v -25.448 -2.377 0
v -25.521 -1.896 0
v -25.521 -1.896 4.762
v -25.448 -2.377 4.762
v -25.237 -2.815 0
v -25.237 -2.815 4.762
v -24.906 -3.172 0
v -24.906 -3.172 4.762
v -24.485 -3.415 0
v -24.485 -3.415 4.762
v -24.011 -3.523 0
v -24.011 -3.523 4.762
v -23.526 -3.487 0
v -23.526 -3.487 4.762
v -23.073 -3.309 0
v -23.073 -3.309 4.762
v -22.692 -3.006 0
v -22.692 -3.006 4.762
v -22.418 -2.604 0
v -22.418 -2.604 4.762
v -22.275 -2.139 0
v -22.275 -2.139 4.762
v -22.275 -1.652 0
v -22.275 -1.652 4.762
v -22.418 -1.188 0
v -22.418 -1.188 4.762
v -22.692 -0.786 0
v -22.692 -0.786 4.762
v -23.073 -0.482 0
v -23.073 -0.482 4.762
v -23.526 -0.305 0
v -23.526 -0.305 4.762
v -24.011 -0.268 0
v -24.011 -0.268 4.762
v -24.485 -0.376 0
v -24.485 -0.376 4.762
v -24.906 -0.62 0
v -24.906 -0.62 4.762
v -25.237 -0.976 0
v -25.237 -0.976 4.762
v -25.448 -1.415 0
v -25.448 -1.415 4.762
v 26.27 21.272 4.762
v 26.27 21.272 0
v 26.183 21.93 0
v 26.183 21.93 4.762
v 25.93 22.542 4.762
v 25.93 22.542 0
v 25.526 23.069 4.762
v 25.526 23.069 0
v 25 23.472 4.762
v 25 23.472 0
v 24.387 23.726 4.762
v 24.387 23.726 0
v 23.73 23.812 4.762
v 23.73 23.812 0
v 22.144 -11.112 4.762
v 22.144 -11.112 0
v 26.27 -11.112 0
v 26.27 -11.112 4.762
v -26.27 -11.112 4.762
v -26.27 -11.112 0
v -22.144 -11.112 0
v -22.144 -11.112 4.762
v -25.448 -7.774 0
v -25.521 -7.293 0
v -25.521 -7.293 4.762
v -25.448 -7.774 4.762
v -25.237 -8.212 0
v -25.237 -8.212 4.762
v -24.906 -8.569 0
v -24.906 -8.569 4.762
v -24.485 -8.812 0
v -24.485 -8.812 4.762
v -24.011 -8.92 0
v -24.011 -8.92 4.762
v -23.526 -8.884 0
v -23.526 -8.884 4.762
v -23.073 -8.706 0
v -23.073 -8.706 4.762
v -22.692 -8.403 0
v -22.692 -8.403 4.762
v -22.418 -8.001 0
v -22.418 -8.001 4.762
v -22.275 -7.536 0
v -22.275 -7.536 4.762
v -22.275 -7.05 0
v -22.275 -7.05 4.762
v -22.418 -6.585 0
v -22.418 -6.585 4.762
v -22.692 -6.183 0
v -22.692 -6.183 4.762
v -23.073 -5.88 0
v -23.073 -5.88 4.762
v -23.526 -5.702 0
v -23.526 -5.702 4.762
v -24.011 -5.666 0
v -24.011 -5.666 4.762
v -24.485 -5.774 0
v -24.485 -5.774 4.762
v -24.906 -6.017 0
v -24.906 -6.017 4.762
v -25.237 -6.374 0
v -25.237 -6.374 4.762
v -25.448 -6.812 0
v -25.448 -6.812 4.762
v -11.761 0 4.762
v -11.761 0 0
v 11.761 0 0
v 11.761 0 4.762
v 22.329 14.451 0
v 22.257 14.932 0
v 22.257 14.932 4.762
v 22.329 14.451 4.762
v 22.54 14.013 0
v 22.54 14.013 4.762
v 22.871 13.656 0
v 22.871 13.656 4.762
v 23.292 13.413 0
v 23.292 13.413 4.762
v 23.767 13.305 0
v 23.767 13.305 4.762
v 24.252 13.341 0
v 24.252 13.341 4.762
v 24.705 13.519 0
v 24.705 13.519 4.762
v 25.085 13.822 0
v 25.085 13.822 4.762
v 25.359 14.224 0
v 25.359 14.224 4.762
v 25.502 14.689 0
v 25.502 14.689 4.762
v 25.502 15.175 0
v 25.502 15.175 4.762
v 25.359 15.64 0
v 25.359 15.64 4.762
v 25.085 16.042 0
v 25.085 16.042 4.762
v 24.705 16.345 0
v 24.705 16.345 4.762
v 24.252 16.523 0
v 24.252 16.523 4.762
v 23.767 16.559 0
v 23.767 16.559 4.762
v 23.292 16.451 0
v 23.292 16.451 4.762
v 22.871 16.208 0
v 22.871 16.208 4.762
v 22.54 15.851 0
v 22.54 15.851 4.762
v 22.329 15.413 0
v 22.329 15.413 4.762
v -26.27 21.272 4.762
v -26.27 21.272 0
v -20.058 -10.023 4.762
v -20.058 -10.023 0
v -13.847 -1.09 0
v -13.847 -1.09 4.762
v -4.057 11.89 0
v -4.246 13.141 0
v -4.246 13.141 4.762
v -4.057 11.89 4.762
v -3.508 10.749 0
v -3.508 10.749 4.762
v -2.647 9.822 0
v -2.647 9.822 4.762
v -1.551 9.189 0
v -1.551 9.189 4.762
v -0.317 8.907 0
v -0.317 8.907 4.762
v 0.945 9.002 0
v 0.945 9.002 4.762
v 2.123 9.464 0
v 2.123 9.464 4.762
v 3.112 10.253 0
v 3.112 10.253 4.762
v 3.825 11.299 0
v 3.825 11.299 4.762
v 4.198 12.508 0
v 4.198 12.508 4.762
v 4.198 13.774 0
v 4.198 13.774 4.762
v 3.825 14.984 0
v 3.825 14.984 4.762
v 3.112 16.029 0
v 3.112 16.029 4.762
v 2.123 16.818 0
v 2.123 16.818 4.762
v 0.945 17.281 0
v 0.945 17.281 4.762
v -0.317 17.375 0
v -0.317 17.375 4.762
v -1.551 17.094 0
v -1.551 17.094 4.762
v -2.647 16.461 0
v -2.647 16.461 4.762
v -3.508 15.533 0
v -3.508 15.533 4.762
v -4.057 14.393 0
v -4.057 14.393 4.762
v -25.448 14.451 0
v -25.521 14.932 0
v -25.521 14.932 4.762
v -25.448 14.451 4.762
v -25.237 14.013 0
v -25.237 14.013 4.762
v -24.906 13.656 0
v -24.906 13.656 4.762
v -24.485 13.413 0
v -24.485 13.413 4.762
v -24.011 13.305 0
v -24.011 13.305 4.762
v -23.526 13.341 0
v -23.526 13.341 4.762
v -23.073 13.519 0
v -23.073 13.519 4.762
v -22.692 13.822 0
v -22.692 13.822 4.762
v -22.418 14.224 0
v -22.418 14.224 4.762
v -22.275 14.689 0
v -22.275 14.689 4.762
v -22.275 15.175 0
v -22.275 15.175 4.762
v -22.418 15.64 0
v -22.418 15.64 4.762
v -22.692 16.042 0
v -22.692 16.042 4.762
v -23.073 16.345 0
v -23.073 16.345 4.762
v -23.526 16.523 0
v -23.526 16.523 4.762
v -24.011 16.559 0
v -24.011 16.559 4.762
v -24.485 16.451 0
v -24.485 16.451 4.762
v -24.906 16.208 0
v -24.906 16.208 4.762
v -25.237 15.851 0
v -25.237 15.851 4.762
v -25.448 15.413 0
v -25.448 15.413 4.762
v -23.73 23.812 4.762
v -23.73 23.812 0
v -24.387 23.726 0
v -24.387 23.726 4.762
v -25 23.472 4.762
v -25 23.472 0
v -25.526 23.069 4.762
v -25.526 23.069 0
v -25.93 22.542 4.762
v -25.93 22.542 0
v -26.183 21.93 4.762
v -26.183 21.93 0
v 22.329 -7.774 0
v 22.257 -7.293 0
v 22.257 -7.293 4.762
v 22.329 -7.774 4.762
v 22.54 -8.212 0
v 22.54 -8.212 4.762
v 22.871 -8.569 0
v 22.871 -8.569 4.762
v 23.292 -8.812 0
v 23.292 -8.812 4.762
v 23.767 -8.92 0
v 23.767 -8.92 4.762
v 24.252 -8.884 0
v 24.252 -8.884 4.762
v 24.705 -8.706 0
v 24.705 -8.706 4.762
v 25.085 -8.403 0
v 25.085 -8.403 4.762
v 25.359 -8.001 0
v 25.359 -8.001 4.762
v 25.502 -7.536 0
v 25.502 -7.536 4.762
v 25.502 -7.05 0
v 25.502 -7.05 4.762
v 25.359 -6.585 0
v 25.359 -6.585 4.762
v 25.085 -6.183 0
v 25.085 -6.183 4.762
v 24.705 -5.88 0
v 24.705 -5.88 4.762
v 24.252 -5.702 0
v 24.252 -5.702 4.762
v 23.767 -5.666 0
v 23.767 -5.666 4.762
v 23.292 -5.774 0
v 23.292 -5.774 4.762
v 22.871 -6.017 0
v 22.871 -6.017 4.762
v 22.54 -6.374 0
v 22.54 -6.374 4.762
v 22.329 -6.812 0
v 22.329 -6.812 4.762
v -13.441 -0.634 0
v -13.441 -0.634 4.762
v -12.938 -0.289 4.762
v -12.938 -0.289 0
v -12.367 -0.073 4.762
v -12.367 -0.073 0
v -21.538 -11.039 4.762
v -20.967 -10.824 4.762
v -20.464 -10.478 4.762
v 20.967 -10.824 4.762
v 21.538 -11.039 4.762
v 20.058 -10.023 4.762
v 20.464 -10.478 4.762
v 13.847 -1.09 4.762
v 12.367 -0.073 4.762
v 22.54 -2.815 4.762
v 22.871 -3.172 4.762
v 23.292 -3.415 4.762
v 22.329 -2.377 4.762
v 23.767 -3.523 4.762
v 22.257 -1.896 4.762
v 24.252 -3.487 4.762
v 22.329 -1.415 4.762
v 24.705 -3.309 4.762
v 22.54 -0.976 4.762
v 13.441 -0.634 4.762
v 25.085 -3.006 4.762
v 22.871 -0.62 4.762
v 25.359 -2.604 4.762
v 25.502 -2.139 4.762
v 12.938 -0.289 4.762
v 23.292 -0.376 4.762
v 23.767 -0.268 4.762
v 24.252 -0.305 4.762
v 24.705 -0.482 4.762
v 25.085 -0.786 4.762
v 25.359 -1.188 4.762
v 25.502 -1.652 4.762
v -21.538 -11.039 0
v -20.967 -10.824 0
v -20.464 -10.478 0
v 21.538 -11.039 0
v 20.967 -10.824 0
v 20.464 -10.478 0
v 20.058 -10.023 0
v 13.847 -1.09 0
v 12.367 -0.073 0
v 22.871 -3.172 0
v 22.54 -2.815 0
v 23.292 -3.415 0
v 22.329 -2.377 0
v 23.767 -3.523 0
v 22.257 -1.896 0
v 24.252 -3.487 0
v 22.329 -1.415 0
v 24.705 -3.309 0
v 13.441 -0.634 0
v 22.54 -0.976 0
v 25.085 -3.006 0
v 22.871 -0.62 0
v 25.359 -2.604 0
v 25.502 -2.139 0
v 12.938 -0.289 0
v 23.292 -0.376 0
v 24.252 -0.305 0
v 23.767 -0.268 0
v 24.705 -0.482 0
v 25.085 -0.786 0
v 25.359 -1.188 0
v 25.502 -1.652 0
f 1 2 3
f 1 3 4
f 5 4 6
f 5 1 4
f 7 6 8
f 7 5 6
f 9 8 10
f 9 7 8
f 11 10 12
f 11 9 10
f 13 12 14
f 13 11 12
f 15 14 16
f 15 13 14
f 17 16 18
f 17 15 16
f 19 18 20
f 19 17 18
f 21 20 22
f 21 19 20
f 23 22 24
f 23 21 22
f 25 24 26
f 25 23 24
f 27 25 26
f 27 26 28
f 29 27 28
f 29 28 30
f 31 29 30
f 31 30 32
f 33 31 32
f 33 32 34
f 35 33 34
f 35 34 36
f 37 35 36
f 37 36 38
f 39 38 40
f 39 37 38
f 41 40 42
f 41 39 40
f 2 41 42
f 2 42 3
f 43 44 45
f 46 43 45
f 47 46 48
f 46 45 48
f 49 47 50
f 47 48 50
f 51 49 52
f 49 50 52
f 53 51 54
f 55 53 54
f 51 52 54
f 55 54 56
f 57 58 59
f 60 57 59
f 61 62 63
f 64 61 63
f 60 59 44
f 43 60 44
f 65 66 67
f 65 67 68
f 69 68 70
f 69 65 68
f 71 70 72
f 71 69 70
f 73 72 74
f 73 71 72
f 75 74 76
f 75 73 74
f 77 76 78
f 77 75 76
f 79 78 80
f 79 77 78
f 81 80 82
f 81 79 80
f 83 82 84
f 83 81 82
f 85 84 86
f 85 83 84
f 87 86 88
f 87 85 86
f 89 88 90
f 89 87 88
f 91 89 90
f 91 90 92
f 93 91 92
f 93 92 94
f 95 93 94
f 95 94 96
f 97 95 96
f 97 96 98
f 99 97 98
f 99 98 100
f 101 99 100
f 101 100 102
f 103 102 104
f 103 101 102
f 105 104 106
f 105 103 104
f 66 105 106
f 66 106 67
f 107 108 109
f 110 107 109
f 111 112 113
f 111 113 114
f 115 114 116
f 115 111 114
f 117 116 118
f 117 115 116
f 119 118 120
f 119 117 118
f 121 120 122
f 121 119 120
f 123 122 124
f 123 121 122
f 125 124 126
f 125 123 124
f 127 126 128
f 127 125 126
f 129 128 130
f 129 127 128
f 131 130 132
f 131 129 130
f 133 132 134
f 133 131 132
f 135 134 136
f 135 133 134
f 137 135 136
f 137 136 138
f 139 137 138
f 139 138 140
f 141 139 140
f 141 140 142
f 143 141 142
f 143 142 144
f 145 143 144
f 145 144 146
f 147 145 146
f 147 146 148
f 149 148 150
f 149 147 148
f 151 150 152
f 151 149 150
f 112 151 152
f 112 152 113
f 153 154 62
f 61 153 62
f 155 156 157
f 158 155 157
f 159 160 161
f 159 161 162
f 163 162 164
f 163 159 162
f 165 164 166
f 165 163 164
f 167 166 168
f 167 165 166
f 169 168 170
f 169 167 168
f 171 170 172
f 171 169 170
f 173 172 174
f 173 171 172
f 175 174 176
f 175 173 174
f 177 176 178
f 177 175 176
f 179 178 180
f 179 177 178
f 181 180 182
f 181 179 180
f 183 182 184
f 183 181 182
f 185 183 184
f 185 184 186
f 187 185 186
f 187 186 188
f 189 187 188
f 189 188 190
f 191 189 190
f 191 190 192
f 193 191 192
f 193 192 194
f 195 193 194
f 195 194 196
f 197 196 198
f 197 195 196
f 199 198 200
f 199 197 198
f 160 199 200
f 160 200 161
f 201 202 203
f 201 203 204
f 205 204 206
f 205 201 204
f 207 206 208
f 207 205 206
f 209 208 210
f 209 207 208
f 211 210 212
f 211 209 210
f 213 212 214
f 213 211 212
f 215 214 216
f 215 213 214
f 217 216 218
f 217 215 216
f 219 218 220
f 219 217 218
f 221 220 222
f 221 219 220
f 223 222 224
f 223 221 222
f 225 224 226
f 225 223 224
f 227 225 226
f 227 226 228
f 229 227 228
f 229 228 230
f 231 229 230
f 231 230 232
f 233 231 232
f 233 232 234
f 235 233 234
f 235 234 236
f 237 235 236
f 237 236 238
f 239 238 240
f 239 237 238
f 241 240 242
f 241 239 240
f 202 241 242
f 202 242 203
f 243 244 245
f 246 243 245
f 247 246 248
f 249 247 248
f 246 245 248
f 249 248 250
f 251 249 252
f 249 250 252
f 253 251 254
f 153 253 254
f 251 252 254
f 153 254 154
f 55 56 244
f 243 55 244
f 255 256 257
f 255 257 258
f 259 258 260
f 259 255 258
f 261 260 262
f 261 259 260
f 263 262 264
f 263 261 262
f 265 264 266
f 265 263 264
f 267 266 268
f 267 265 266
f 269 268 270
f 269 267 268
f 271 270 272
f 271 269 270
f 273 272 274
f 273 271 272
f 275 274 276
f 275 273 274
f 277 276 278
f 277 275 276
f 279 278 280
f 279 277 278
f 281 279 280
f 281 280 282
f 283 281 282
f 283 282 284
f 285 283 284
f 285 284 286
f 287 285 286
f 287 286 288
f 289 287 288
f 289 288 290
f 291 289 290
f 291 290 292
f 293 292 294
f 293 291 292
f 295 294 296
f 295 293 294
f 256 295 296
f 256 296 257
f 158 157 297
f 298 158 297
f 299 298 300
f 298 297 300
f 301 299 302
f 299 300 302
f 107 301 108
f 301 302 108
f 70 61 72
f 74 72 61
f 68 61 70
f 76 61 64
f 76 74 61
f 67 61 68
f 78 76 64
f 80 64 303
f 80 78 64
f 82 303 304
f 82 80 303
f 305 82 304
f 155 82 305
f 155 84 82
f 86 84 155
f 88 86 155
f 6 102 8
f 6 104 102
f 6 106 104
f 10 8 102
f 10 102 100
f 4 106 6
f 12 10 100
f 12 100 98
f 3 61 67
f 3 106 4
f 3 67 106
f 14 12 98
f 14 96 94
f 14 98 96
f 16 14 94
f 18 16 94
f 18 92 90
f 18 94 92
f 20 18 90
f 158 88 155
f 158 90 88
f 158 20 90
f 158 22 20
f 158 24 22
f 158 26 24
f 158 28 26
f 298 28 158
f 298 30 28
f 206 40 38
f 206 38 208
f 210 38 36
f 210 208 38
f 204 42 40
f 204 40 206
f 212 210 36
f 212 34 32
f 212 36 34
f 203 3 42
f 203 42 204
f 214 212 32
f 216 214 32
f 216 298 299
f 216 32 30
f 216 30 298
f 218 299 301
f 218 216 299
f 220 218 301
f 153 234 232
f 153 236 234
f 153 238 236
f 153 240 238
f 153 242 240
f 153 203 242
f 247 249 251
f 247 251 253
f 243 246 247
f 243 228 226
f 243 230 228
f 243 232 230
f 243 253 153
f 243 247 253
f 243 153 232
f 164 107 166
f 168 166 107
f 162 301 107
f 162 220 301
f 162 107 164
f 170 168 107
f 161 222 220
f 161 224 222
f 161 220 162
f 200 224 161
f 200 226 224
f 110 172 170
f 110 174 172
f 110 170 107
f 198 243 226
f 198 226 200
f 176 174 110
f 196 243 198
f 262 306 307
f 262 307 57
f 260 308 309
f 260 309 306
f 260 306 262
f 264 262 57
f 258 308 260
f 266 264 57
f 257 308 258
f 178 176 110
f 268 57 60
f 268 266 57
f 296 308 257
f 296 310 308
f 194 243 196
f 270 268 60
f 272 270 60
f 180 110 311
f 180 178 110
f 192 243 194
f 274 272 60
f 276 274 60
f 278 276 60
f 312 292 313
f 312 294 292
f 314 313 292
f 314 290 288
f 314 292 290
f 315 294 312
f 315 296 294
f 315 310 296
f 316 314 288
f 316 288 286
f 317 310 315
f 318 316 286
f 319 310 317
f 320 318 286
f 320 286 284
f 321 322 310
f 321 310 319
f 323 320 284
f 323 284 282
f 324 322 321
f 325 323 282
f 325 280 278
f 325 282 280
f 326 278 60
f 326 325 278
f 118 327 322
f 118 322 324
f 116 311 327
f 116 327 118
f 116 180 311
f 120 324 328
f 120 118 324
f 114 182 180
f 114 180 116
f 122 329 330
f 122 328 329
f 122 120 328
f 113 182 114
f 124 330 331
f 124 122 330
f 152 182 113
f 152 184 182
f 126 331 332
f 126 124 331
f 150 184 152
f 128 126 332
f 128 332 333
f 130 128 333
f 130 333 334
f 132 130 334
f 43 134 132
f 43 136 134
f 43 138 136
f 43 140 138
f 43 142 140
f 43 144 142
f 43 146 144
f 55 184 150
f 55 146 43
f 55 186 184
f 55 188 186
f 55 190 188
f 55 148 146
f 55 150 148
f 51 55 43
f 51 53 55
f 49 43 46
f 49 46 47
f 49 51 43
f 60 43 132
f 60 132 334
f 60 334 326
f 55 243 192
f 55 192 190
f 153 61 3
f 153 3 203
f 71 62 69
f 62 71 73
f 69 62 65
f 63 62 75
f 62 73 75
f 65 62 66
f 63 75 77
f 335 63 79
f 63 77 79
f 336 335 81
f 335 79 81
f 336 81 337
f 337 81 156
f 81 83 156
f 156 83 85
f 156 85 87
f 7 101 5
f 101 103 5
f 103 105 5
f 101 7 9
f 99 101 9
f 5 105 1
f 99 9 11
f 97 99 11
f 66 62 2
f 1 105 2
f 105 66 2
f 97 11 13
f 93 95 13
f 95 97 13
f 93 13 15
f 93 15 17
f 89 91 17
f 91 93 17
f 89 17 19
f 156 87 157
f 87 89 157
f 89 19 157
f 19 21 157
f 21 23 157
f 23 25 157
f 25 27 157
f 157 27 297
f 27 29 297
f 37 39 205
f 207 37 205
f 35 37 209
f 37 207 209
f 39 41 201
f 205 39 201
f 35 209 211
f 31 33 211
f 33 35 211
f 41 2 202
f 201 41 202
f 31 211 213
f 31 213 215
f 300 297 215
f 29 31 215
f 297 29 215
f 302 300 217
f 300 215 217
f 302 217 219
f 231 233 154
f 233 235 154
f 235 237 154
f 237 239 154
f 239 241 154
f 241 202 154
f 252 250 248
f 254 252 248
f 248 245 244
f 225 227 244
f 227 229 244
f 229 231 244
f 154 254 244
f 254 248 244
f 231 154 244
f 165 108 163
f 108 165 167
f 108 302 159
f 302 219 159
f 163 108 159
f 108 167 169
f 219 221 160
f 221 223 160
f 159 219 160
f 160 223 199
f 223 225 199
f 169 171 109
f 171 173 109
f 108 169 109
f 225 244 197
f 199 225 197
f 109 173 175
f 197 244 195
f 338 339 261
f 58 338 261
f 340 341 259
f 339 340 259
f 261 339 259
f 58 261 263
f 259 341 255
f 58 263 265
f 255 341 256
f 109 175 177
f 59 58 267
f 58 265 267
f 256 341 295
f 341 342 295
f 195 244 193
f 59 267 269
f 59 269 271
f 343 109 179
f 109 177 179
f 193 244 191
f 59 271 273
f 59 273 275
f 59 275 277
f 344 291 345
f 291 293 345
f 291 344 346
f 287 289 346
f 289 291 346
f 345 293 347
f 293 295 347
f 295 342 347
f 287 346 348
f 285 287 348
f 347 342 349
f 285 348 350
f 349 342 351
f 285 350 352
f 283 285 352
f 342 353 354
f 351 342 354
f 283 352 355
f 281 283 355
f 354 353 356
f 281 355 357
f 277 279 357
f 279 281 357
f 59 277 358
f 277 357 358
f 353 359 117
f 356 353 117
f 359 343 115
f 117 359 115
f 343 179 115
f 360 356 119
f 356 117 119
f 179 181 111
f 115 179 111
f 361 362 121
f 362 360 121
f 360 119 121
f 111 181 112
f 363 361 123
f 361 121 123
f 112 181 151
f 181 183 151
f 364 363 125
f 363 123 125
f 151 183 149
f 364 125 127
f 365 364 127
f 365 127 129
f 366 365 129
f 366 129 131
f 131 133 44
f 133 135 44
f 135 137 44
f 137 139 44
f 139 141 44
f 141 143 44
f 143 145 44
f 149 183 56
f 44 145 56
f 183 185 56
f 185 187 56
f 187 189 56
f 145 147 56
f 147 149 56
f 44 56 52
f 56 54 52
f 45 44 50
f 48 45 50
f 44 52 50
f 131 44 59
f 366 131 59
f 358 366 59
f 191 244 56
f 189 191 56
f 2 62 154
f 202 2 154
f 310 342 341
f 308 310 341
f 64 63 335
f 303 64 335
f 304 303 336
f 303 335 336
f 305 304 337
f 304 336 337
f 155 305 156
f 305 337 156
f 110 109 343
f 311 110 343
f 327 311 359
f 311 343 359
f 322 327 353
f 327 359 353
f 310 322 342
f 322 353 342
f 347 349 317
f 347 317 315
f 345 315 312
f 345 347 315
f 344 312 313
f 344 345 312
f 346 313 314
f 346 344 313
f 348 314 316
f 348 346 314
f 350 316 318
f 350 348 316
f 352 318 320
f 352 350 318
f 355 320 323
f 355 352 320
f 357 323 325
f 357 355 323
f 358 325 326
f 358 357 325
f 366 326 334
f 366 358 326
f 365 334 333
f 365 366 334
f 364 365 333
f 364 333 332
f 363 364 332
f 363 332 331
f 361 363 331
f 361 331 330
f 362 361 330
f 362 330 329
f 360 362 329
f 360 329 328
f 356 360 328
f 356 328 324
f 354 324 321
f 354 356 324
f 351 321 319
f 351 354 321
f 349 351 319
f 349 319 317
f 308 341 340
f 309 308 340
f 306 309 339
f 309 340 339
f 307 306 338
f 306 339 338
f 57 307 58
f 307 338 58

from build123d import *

# Parameters (mm, degrees)
SKETCH1_R           = 1.63195
SKETCH1_R_2         = 4.245922678
BOSS_EXTRUDE1_DEPTH = 4.7625


with BuildPart() as part:
    # Sketch1 → Boss-Extrude1 (new body)
    with BuildSketch(Plane.XY):
        with BuildLine():
            Line((-26.26995, -11.1125), (-22.143527073, -11.1125))
            ThreePointArc((-22.143527073, -11.1125), (-20.967014102, -10.823592453), (-20.058141665, -10.022592307))
            Line((-20.058141665, -10.022592307), (-13.846715616, -1.089907693))
            ThreePointArc((-13.846715616, -1.089907693), (-12.937843178, -0.288907547), (-11.761330208, 0))
            Line((-11.761330208, 0), (11.761330208, 0))
            ThreePointArc((11.761330208, 0), (12.937843178, -0.288907547), (13.846715616, -1.089907693))
            Line((13.846715616, -1.089907693), (20.058141665, -10.022592307))
            ThreePointArc((20.058141665, -10.022592307), (20.967014102, -10.823592453), (22.143527073, -11.1125))
            Line((22.143527073, -11.1125), (26.26995, -11.1125))
            Line((26.26995, -11.1125), (26.26995, 21.2725))
            ThreePointArc((26.26995, 21.2725), (25.526001224, 23.068551224), (23.72995, 23.8125))
            Line((23.72995, 23.8125), (-23.72995, 23.8125))
            ThreePointArc((-23.72995, 23.8125), (-25.526001224, 23.068551224), (-26.26995, 21.2725))
            Line((-26.26995, 21.2725), (-26.26995, -11.1125))
        make_face()
        with Locations(Location((23.8887, 14.931889209, 0), (0, 0, 180))):
            Circle(SKETCH1_R, mode=Mode.SUBTRACT)
        with Locations(Location((23.8887, -7.293110791, 0), (0, 0, 180))):
            Circle(SKETCH1_R, mode=Mode.SUBTRACT)
        with Locations(Location((-23.8887, -7.293110791, 0), (0, 0, 180))):
            Circle(SKETCH1_R, mode=Mode.SUBTRACT)
        with Locations(Location((-23.8887, 14.931889209, 0), (0, 0, 180))):
            Circle(SKETCH1_R, mode=Mode.SUBTRACT)
        with Locations(Location((23.8887, -1.895610791, 0), (0, 0, 180))):
            Circle(SKETCH1_R, mode=Mode.SUBTRACT)
        with Locations(Location((-23.8887, -1.895610791, 0), (0, 0, 180))):
            Circle(SKETCH1_R, mode=Mode.SUBTRACT)
        with Locations(Location((0, 13.141292549, 0), (0, 0, 180))):
            Circle(SKETCH1_R_2, mode=Mode.SUBTRACT)
    extrude(amount=BOSS_EXTRUDE1_DEPTH)


solid = part.part
